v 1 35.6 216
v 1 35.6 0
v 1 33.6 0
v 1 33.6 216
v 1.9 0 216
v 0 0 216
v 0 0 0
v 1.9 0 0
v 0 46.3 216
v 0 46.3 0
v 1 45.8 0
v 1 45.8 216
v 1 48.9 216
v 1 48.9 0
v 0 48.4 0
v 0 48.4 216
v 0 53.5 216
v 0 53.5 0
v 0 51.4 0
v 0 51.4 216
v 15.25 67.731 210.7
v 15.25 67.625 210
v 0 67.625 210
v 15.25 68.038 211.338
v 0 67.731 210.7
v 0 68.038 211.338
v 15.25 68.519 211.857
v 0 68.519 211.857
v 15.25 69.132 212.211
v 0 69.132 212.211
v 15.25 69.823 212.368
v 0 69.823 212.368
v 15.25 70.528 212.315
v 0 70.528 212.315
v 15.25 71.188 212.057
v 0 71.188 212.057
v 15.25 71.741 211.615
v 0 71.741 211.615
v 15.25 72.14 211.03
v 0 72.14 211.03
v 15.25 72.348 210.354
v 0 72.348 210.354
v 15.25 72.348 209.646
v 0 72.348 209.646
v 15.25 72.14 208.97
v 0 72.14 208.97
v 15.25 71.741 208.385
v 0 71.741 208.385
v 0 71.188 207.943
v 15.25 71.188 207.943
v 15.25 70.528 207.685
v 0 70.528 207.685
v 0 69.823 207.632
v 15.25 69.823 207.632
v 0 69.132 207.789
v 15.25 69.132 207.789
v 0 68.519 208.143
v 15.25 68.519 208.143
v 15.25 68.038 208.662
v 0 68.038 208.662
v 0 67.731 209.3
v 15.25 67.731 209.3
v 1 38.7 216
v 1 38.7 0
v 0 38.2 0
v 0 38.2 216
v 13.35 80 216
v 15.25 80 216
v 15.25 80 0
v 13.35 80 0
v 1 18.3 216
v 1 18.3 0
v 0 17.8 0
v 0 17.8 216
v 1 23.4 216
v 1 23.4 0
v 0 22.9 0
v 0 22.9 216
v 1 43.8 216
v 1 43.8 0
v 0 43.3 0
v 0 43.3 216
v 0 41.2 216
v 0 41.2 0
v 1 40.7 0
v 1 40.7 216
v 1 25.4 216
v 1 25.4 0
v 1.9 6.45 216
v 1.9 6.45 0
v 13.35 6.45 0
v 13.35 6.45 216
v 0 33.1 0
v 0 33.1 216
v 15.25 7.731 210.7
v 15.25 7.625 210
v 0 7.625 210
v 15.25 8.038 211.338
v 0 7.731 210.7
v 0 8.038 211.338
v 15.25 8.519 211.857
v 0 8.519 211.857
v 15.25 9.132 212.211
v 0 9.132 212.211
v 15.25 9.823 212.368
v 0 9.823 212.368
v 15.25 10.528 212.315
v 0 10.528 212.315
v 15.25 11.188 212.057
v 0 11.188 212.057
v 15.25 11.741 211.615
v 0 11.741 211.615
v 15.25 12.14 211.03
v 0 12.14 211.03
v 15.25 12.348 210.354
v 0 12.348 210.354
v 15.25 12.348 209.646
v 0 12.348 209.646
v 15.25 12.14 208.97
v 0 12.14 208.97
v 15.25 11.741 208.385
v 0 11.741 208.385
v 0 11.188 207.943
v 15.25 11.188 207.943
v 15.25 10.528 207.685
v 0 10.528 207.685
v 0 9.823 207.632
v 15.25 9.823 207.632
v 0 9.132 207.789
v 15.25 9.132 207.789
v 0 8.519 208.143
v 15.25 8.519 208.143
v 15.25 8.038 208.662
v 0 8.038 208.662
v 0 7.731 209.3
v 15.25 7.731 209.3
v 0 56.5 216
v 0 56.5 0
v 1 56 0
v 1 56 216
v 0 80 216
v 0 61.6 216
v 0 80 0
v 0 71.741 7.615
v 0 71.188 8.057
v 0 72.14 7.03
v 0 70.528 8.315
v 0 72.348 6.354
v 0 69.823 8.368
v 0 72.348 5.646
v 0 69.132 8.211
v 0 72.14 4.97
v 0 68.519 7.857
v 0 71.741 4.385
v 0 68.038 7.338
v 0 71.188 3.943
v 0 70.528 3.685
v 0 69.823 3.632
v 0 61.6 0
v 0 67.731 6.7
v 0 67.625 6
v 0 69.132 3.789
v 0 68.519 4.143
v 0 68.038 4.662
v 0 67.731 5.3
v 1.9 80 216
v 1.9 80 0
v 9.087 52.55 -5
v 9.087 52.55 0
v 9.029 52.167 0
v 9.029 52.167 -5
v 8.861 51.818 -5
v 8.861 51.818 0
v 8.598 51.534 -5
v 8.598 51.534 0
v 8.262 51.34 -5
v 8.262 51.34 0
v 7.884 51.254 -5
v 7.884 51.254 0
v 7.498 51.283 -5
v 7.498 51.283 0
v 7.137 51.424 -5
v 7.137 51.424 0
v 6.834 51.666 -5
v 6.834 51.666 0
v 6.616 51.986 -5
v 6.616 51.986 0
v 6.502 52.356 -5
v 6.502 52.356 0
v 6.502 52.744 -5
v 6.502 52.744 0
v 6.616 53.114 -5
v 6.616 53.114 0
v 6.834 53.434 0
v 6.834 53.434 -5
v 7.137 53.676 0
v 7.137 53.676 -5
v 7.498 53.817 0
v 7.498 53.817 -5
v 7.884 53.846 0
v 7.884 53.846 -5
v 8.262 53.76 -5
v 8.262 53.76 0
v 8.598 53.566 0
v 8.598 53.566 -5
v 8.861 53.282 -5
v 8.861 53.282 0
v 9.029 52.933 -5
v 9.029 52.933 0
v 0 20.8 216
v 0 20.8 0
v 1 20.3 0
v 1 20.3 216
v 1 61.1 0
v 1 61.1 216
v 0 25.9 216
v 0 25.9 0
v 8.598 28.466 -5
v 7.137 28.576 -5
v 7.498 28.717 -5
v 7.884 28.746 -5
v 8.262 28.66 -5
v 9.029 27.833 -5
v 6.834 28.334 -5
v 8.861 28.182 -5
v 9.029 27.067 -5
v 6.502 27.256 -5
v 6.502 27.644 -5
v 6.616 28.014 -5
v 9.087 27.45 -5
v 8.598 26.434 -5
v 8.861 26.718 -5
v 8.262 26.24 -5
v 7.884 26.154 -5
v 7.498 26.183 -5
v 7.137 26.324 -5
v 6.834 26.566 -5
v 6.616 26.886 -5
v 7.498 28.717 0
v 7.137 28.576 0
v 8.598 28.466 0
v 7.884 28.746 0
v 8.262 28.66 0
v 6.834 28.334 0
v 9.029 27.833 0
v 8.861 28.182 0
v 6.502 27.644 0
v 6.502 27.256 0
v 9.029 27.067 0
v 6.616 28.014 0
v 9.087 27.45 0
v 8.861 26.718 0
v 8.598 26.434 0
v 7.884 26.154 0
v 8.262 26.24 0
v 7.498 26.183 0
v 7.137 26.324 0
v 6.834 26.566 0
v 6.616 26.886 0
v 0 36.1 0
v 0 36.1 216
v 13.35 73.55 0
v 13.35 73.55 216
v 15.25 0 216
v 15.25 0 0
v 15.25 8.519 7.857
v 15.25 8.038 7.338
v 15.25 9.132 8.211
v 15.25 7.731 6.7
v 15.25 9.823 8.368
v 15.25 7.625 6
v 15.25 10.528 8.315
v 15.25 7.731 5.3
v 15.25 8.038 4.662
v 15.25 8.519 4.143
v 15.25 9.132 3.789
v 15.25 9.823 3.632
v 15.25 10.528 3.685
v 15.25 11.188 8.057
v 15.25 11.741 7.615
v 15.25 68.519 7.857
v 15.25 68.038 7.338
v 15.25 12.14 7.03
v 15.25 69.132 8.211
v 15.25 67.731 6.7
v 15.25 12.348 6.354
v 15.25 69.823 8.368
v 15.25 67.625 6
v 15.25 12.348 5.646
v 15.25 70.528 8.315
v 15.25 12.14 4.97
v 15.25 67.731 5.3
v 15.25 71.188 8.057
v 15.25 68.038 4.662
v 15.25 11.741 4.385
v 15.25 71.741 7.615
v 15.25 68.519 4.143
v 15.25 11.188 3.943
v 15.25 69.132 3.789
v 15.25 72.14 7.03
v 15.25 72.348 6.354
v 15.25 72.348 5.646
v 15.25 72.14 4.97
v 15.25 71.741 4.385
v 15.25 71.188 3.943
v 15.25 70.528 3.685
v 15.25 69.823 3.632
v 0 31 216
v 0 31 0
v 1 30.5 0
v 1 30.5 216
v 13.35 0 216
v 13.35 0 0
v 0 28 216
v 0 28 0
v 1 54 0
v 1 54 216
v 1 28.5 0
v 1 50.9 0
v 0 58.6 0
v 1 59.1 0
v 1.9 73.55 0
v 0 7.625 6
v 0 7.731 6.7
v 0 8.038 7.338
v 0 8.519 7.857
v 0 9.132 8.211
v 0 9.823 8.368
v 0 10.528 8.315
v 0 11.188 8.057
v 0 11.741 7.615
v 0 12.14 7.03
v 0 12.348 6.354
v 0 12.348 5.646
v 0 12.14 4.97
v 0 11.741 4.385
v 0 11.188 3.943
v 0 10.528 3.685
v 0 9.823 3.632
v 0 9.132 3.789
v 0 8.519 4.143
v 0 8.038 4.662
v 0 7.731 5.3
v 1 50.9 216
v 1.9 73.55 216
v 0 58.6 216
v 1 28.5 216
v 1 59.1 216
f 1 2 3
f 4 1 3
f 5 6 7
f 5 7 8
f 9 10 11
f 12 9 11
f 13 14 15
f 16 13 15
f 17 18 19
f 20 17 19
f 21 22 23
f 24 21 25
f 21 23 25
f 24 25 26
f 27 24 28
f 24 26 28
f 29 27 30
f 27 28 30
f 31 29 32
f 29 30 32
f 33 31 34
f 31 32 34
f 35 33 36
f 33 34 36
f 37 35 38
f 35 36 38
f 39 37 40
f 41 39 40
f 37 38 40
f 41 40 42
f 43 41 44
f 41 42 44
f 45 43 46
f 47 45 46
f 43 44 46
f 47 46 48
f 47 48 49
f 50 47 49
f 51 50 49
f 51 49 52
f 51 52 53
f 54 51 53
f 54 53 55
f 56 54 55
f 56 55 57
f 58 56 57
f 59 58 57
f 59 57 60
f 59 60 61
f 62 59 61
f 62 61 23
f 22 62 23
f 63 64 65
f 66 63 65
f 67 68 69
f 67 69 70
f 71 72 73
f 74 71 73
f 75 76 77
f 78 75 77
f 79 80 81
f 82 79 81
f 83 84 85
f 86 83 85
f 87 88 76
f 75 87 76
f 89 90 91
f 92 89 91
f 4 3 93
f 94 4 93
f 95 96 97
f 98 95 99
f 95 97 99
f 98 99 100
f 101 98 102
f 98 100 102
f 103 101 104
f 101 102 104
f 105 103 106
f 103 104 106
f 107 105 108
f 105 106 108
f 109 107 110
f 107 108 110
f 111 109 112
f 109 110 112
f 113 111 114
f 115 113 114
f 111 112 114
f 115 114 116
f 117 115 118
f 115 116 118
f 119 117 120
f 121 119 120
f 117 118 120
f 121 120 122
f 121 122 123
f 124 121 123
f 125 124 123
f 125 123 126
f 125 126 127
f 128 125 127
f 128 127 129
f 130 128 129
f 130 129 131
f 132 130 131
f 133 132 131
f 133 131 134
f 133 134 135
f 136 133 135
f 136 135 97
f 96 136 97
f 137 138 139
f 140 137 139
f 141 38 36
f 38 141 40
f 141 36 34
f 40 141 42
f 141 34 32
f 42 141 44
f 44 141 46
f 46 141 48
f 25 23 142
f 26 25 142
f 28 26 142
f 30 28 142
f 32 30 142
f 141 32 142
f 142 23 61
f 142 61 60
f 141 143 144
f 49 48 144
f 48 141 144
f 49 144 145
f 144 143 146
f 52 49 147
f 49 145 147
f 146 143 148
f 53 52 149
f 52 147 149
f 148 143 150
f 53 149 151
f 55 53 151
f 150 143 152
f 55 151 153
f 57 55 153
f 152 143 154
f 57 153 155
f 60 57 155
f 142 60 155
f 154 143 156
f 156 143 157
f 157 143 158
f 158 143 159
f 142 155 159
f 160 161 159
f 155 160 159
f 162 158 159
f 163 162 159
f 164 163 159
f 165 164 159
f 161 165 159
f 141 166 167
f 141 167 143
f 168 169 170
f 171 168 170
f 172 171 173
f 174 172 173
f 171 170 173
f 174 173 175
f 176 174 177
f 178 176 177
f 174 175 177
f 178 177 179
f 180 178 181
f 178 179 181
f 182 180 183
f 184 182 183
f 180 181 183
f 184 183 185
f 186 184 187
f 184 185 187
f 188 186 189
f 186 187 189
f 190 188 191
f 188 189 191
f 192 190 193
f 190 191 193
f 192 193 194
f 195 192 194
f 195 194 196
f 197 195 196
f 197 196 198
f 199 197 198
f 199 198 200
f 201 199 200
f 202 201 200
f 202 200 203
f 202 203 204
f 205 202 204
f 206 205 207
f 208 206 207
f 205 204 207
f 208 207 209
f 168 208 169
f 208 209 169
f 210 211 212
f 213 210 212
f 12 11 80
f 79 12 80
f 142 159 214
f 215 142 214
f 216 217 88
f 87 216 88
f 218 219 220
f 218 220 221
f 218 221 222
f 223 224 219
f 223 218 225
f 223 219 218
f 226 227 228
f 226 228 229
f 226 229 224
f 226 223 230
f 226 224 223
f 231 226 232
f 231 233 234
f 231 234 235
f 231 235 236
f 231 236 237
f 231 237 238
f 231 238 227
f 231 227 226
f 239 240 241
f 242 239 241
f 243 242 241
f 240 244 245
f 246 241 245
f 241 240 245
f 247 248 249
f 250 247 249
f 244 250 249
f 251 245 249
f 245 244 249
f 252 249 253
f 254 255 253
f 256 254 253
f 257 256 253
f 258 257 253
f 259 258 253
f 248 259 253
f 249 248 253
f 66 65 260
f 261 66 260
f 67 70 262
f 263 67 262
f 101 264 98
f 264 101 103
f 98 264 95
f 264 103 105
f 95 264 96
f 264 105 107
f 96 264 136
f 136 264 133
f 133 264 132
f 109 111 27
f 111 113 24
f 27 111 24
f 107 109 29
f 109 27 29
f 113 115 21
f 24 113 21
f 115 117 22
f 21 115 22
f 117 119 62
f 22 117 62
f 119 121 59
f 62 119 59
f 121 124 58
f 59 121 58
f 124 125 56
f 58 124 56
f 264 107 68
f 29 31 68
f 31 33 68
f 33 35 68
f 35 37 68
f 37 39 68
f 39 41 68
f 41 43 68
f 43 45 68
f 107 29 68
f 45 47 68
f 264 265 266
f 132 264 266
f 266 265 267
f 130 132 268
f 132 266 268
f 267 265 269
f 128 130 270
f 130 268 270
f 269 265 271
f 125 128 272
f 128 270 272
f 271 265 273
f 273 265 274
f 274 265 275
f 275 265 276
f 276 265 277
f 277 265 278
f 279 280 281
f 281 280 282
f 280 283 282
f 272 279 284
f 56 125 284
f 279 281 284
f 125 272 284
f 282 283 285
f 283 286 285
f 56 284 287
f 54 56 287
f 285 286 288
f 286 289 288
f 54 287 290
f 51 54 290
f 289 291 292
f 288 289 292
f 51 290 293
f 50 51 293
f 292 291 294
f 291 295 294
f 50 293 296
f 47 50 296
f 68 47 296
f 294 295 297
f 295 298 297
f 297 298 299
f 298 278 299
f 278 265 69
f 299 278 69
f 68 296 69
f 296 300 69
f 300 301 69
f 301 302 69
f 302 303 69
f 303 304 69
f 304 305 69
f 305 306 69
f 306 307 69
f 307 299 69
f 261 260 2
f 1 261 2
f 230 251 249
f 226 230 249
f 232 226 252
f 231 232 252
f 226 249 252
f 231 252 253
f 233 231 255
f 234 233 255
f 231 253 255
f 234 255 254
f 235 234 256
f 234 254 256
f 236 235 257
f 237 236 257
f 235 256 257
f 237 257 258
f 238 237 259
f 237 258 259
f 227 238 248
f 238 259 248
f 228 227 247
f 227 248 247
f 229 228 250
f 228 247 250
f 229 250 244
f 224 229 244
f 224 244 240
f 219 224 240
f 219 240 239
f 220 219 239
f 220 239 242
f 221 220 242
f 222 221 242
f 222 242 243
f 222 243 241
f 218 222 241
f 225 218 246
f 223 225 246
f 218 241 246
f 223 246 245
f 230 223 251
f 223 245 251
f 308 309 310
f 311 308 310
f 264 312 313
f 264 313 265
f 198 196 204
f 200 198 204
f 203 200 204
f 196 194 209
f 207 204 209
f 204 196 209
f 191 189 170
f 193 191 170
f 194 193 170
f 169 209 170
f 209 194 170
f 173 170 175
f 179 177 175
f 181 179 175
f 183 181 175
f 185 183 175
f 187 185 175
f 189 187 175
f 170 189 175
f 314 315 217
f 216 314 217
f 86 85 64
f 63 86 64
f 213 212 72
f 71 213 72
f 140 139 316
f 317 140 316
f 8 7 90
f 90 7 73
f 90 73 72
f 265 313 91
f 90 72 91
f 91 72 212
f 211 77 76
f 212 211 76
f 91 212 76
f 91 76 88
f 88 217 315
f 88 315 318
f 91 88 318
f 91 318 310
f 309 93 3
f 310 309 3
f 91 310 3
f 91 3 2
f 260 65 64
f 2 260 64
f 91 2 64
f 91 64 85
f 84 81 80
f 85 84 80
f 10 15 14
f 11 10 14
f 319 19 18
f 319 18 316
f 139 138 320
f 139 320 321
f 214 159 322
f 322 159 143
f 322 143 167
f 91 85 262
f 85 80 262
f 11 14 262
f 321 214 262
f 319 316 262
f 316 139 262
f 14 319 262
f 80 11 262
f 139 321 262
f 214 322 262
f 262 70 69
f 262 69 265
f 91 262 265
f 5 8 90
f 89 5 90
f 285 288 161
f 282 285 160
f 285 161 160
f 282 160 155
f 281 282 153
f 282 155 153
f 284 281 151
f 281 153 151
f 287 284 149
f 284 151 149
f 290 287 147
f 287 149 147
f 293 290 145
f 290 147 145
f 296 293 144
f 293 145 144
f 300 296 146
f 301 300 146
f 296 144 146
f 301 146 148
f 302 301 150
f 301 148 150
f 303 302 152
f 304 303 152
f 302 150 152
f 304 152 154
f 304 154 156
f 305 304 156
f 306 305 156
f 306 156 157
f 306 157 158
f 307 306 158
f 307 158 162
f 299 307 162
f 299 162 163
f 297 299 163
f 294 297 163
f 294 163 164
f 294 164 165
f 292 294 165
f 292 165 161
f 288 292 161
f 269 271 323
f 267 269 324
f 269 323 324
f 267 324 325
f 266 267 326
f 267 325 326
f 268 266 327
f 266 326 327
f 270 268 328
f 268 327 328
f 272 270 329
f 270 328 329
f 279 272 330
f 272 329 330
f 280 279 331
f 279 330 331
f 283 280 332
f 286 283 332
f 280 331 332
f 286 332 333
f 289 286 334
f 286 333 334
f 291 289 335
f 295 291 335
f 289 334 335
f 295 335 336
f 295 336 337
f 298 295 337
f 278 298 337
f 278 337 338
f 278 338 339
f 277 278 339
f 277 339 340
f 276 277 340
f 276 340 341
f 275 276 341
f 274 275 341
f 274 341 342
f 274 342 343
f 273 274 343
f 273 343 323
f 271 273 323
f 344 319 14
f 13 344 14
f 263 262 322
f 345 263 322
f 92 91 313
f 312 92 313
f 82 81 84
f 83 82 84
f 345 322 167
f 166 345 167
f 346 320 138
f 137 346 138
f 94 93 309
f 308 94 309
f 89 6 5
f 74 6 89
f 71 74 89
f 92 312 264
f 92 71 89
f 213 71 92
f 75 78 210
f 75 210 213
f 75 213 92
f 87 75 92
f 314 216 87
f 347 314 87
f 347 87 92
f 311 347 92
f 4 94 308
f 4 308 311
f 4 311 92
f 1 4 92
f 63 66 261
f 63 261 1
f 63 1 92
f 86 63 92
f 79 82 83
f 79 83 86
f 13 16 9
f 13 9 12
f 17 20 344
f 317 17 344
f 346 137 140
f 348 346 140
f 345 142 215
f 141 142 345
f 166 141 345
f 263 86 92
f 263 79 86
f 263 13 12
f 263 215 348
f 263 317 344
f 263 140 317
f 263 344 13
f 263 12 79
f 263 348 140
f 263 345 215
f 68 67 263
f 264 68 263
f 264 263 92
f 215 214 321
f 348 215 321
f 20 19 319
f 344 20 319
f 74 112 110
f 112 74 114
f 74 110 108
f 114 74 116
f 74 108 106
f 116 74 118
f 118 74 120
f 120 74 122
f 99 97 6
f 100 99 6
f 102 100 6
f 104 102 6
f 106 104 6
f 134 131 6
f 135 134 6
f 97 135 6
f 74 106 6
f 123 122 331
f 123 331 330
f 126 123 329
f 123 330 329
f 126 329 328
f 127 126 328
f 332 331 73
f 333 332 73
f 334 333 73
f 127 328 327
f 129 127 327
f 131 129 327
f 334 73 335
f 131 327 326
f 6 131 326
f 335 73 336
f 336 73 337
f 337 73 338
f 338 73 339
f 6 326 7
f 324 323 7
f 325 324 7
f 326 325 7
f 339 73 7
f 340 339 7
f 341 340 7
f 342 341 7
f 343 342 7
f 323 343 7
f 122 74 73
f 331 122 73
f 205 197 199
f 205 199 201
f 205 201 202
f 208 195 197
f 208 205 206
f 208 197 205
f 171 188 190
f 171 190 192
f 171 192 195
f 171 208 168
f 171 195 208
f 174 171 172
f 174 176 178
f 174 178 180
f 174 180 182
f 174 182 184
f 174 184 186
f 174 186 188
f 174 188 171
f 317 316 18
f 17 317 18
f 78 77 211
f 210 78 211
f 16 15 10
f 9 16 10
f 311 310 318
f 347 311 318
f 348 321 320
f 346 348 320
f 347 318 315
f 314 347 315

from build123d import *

# Parameters (mm, degrees)
F1_DEPTH = 216
F2_R     = 2.375
F3_DEPTH = 15.251
F4_R     = 1.3
F5_DEPTH = 5
F6_DEPTH = 5


with BuildPart() as f1:
    # F0 (on Top) → F1 (new body)
    with BuildSketch(Plane.XY):
        Polygon((0, 17.8), (0, 0), (1.9, 0), (1.9, 6.45), (13.35, 6.45), (13.35, 0), (15.25, 0), (15.25, 80), (13.35, 80), (13.35, 73.55), (1.9, 73.55), (1.9, 80), (0, 80), (0, 61.6), (1, 61.1), (1, 59.1), (0, 58.6), (0, 56.5), (1, 56), (1, 54), (0, 53.5), (0, 51.4), (1, 50.9), (1, 48.9), (0, 48.4), (0, 46.3), (1, 45.8), (1, 43.8), (0, 43.3), (0, 41.2), (1, 40.7), (1, 38.7), (0, 38.2), (0, 36.1), (1, 35.6), (1, 33.6), (0, 33.1), (0, 31), (1, 30.5), (1, 28.5), (0, 28), (0, 25.9), (1, 25.4), (1, 23.4), (0, 22.9), (0, 20.8), (1, 20.3), (1, 18.3), align=None)
    extrude(amount=F1_DEPTH)

    # F2 (on face) → F3 (cut, through all)
    with BuildSketch(Plane(origin=(0, 0, 0), x_dir=(0, -1, 0), z_dir=(-1, 0, 0))):
        with Locations((-70, 6)):
            Circle(F2_R)
        with Locations((-10, 6)):
            Circle(F2_R)
        with Locations((-70, 210)):
            Circle(F2_R)
        with Locations((-10, 210)):
            Circle(F2_R)
    extrude(amount=-F3_DEPTH, mode=Mode.SUBTRACT)


with BuildPart() as f5:
    # F4 (on face) → F5 (new body)
    with BuildSketch(Plane(origin=(0, 0, 0), x_dir=(1, 0, 0), z_dir=(0, 0, -1))):
        with Locations((7.787197, -27.45)):
            Circle(F4_R)
    extrude(amount=F5_DEPTH)


with BuildPart() as f6:
    # F4 (on face) → F6 (new body)
    with BuildSketch(Plane(origin=(0, 0, 0), x_dir=(1, 0, 0), z_dir=(0, 0, -1))):
        with Locations((7.787197, -52.55)):
            Circle(F4_R)
    extrude(amount=F6_DEPTH)


solid = Compound([f1.part, f5.part, f6.part])
